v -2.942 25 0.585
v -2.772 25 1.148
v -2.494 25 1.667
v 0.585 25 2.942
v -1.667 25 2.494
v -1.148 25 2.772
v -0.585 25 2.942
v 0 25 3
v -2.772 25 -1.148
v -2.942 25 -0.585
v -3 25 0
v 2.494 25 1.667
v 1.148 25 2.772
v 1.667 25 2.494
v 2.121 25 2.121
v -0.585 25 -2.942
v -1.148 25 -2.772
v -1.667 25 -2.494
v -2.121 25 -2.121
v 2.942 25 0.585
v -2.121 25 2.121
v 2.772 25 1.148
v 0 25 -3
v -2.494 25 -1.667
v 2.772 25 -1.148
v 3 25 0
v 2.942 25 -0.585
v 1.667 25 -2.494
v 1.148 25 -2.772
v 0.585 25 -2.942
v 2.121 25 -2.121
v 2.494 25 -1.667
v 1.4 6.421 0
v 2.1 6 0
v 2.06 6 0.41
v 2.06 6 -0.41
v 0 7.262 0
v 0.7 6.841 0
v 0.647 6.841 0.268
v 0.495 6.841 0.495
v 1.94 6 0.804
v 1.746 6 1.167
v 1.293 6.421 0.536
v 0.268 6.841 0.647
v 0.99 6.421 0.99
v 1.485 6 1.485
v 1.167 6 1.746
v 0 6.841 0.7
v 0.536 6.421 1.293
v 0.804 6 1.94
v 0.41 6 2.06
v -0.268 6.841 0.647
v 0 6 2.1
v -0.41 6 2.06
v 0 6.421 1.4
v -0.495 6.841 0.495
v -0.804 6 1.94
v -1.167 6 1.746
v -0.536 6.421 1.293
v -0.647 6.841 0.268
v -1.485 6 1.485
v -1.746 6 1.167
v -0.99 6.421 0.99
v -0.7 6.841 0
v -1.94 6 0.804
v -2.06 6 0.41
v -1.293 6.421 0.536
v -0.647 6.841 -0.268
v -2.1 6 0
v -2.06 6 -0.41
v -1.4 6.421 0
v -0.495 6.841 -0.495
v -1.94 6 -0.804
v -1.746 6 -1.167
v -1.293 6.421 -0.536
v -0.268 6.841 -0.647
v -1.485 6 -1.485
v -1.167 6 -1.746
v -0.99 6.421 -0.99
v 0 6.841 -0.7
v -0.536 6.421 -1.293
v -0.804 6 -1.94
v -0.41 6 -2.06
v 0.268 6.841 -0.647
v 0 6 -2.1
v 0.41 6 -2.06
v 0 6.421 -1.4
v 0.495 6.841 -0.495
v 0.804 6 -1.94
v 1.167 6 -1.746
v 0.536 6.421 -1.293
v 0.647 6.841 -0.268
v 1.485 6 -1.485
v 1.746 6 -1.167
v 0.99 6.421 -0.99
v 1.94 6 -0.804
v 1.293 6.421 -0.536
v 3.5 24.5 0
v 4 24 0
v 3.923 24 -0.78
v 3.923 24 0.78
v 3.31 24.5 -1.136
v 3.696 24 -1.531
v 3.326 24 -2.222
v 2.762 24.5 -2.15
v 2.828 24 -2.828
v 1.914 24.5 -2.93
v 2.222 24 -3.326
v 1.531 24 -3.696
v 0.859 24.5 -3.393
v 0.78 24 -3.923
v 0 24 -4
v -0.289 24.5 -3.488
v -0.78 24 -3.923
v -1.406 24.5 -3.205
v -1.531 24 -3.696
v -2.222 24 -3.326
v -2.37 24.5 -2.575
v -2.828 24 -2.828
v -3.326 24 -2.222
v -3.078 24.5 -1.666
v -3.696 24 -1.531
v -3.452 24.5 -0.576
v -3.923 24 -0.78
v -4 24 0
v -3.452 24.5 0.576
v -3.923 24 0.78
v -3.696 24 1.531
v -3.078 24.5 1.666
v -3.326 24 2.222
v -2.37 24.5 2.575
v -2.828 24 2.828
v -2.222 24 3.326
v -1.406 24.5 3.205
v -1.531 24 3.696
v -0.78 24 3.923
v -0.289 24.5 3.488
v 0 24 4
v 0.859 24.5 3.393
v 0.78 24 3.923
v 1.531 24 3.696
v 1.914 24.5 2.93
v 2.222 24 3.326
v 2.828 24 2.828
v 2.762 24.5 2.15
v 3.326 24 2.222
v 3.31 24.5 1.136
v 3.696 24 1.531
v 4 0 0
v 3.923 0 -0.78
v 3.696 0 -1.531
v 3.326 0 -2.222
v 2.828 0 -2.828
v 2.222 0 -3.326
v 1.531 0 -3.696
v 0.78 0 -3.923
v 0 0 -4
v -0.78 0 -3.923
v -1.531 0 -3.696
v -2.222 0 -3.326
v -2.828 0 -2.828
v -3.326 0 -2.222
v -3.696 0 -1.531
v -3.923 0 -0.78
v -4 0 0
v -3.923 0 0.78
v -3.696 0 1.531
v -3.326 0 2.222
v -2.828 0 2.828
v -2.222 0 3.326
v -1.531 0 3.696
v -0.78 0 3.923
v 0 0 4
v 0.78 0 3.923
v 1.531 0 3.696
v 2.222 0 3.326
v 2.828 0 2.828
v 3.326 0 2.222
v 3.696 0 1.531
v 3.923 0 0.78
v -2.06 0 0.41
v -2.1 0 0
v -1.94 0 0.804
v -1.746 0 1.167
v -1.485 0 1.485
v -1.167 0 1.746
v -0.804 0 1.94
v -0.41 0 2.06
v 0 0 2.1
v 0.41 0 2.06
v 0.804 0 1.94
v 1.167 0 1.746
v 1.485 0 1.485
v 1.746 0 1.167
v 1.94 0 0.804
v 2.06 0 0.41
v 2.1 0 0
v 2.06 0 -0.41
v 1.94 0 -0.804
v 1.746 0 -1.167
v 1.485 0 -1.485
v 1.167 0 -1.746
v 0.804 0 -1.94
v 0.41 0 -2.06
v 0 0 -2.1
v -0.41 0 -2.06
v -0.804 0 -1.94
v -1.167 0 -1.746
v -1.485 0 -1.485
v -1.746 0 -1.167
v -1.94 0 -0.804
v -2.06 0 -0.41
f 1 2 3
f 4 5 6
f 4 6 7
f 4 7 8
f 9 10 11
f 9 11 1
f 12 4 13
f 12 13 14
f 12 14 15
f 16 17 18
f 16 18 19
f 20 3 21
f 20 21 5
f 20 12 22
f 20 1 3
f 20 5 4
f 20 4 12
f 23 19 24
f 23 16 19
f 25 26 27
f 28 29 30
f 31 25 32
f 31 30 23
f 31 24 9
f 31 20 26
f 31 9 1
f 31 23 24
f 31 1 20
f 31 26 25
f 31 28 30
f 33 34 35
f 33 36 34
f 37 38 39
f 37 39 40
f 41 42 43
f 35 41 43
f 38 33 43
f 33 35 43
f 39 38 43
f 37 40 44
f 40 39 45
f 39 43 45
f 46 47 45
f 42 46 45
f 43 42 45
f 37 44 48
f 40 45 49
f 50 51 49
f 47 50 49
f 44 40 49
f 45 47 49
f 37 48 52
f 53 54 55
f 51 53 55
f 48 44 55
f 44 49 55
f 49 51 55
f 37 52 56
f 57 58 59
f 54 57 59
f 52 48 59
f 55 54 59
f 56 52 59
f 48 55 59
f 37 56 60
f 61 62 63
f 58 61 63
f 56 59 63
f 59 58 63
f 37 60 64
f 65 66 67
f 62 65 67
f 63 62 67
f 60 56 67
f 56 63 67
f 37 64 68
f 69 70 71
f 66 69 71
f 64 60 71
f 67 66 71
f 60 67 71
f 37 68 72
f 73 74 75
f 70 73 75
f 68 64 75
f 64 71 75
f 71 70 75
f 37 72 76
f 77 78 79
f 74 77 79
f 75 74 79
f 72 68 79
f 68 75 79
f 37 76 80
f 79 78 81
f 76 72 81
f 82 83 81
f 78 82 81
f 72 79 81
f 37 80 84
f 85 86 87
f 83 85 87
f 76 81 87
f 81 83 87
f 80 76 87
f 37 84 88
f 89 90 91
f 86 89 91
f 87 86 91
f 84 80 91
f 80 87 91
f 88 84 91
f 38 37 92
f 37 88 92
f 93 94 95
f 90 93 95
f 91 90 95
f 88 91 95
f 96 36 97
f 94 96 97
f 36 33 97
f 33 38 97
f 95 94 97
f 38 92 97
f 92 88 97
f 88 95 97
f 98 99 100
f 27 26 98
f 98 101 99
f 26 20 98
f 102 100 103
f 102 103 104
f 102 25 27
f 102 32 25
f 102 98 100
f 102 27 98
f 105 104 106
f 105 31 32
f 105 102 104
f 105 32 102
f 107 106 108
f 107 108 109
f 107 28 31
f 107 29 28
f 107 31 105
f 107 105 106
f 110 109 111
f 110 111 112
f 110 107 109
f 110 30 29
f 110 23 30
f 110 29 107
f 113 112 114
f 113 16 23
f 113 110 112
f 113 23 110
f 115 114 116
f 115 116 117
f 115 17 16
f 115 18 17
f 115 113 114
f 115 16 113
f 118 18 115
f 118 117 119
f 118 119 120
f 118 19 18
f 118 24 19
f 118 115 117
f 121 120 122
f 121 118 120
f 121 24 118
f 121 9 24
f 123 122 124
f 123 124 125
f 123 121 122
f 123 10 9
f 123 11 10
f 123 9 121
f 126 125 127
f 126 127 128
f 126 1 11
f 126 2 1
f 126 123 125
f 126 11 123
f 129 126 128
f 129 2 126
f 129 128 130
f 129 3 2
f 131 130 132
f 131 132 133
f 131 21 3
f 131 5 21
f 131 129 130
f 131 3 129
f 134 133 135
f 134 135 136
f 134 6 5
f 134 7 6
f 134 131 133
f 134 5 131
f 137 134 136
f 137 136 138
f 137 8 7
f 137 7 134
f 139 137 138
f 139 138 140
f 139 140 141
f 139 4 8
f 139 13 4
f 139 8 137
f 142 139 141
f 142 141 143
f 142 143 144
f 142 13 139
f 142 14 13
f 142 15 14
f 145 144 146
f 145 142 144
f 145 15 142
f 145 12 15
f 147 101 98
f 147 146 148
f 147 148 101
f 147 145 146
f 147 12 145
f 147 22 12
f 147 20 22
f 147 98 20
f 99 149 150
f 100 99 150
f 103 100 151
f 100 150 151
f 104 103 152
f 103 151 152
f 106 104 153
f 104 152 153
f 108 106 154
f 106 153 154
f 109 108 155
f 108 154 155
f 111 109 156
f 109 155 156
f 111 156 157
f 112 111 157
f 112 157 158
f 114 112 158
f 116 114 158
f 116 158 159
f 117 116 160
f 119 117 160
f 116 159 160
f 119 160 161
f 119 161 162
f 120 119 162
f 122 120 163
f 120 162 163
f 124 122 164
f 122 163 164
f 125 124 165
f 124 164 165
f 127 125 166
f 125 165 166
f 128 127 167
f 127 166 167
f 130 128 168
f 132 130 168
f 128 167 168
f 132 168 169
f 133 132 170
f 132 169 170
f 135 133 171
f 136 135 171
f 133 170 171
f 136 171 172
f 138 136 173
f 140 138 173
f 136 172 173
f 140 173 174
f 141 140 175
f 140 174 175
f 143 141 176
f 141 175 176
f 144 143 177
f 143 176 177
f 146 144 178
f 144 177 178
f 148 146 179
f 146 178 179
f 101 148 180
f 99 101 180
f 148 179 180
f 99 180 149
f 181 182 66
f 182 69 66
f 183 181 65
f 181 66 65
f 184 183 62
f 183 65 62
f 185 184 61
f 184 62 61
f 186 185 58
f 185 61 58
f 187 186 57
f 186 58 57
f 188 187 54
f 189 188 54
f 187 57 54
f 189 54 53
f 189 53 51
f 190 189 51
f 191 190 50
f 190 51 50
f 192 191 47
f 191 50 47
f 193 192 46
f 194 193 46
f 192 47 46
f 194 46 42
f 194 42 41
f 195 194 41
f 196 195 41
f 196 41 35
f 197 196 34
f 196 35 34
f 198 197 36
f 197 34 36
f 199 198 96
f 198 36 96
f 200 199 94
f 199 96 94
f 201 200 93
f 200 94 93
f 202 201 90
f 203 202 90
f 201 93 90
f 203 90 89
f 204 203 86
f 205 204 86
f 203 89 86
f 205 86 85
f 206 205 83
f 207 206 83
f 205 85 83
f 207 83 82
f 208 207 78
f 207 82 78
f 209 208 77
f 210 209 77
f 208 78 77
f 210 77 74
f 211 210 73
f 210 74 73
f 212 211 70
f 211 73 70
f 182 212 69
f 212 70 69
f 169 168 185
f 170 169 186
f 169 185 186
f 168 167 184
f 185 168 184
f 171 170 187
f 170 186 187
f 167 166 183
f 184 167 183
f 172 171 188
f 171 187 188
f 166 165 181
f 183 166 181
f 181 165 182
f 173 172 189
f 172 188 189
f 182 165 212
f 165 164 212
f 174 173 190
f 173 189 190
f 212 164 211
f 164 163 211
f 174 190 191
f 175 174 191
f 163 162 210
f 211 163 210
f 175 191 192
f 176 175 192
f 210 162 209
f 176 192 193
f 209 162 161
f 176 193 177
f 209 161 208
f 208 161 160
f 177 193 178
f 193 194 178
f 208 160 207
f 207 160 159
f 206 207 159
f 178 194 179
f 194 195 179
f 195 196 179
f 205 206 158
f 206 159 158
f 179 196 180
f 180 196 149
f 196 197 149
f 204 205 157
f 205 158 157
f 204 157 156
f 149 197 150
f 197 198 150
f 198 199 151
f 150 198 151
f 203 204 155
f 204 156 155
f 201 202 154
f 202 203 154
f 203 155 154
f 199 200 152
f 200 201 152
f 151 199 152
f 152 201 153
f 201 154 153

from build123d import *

# Parameters (mm, degrees)
SKETCH1_R             = 4
BOSS_EXTRUDE1_DEPTH   = 25
CHAMFER1_SIZE         = 1
M5_TAPPED_HOLE1_D     = 4.2
M5_TAPPED_HOLE1_DEPTH = 6
M5_TAPPED_HOLE1_TIP   = 1.2618073


with BuildPart() as part:
    # Sketch1 → Boss-Extrude1 (new body)
    with BuildSketch(Plane(origin=(0, 0, 0), x_dir=(1, 0, 0), z_dir=(0, 1, 0))):
        Circle(SKETCH1_R)
    extrude(amount=BOSS_EXTRUDE1_DEPTH)

    # Chamfer1
    chamfer1_edges = [part.edges().sort_by_distance(p)[0] for p in [
        (-4, 25, 0),
    ]]
    chamfer(chamfer1_edges, length=CHAMFER1_SIZE)

    # M5 Tapped Hole1
    with Locations(Plane.XZ):
        with Locations((0, 0)):
            Hole(M5_TAPPED_HOLE1_D / 2, depth=M5_TAPPED_HOLE1_DEPTH)
            with Locations((0, 0, -(M5_TAPPED_HOLE1_DEPTH + M5_TAPPED_HOLE1_TIP / 2))):  # 118° drill point
                Cone(0, M5_TAPPED_HOLE1_D / 2, M5_TAPPED_HOLE1_TIP, mode=Mode.SUBTRACT)


solid = part.part
